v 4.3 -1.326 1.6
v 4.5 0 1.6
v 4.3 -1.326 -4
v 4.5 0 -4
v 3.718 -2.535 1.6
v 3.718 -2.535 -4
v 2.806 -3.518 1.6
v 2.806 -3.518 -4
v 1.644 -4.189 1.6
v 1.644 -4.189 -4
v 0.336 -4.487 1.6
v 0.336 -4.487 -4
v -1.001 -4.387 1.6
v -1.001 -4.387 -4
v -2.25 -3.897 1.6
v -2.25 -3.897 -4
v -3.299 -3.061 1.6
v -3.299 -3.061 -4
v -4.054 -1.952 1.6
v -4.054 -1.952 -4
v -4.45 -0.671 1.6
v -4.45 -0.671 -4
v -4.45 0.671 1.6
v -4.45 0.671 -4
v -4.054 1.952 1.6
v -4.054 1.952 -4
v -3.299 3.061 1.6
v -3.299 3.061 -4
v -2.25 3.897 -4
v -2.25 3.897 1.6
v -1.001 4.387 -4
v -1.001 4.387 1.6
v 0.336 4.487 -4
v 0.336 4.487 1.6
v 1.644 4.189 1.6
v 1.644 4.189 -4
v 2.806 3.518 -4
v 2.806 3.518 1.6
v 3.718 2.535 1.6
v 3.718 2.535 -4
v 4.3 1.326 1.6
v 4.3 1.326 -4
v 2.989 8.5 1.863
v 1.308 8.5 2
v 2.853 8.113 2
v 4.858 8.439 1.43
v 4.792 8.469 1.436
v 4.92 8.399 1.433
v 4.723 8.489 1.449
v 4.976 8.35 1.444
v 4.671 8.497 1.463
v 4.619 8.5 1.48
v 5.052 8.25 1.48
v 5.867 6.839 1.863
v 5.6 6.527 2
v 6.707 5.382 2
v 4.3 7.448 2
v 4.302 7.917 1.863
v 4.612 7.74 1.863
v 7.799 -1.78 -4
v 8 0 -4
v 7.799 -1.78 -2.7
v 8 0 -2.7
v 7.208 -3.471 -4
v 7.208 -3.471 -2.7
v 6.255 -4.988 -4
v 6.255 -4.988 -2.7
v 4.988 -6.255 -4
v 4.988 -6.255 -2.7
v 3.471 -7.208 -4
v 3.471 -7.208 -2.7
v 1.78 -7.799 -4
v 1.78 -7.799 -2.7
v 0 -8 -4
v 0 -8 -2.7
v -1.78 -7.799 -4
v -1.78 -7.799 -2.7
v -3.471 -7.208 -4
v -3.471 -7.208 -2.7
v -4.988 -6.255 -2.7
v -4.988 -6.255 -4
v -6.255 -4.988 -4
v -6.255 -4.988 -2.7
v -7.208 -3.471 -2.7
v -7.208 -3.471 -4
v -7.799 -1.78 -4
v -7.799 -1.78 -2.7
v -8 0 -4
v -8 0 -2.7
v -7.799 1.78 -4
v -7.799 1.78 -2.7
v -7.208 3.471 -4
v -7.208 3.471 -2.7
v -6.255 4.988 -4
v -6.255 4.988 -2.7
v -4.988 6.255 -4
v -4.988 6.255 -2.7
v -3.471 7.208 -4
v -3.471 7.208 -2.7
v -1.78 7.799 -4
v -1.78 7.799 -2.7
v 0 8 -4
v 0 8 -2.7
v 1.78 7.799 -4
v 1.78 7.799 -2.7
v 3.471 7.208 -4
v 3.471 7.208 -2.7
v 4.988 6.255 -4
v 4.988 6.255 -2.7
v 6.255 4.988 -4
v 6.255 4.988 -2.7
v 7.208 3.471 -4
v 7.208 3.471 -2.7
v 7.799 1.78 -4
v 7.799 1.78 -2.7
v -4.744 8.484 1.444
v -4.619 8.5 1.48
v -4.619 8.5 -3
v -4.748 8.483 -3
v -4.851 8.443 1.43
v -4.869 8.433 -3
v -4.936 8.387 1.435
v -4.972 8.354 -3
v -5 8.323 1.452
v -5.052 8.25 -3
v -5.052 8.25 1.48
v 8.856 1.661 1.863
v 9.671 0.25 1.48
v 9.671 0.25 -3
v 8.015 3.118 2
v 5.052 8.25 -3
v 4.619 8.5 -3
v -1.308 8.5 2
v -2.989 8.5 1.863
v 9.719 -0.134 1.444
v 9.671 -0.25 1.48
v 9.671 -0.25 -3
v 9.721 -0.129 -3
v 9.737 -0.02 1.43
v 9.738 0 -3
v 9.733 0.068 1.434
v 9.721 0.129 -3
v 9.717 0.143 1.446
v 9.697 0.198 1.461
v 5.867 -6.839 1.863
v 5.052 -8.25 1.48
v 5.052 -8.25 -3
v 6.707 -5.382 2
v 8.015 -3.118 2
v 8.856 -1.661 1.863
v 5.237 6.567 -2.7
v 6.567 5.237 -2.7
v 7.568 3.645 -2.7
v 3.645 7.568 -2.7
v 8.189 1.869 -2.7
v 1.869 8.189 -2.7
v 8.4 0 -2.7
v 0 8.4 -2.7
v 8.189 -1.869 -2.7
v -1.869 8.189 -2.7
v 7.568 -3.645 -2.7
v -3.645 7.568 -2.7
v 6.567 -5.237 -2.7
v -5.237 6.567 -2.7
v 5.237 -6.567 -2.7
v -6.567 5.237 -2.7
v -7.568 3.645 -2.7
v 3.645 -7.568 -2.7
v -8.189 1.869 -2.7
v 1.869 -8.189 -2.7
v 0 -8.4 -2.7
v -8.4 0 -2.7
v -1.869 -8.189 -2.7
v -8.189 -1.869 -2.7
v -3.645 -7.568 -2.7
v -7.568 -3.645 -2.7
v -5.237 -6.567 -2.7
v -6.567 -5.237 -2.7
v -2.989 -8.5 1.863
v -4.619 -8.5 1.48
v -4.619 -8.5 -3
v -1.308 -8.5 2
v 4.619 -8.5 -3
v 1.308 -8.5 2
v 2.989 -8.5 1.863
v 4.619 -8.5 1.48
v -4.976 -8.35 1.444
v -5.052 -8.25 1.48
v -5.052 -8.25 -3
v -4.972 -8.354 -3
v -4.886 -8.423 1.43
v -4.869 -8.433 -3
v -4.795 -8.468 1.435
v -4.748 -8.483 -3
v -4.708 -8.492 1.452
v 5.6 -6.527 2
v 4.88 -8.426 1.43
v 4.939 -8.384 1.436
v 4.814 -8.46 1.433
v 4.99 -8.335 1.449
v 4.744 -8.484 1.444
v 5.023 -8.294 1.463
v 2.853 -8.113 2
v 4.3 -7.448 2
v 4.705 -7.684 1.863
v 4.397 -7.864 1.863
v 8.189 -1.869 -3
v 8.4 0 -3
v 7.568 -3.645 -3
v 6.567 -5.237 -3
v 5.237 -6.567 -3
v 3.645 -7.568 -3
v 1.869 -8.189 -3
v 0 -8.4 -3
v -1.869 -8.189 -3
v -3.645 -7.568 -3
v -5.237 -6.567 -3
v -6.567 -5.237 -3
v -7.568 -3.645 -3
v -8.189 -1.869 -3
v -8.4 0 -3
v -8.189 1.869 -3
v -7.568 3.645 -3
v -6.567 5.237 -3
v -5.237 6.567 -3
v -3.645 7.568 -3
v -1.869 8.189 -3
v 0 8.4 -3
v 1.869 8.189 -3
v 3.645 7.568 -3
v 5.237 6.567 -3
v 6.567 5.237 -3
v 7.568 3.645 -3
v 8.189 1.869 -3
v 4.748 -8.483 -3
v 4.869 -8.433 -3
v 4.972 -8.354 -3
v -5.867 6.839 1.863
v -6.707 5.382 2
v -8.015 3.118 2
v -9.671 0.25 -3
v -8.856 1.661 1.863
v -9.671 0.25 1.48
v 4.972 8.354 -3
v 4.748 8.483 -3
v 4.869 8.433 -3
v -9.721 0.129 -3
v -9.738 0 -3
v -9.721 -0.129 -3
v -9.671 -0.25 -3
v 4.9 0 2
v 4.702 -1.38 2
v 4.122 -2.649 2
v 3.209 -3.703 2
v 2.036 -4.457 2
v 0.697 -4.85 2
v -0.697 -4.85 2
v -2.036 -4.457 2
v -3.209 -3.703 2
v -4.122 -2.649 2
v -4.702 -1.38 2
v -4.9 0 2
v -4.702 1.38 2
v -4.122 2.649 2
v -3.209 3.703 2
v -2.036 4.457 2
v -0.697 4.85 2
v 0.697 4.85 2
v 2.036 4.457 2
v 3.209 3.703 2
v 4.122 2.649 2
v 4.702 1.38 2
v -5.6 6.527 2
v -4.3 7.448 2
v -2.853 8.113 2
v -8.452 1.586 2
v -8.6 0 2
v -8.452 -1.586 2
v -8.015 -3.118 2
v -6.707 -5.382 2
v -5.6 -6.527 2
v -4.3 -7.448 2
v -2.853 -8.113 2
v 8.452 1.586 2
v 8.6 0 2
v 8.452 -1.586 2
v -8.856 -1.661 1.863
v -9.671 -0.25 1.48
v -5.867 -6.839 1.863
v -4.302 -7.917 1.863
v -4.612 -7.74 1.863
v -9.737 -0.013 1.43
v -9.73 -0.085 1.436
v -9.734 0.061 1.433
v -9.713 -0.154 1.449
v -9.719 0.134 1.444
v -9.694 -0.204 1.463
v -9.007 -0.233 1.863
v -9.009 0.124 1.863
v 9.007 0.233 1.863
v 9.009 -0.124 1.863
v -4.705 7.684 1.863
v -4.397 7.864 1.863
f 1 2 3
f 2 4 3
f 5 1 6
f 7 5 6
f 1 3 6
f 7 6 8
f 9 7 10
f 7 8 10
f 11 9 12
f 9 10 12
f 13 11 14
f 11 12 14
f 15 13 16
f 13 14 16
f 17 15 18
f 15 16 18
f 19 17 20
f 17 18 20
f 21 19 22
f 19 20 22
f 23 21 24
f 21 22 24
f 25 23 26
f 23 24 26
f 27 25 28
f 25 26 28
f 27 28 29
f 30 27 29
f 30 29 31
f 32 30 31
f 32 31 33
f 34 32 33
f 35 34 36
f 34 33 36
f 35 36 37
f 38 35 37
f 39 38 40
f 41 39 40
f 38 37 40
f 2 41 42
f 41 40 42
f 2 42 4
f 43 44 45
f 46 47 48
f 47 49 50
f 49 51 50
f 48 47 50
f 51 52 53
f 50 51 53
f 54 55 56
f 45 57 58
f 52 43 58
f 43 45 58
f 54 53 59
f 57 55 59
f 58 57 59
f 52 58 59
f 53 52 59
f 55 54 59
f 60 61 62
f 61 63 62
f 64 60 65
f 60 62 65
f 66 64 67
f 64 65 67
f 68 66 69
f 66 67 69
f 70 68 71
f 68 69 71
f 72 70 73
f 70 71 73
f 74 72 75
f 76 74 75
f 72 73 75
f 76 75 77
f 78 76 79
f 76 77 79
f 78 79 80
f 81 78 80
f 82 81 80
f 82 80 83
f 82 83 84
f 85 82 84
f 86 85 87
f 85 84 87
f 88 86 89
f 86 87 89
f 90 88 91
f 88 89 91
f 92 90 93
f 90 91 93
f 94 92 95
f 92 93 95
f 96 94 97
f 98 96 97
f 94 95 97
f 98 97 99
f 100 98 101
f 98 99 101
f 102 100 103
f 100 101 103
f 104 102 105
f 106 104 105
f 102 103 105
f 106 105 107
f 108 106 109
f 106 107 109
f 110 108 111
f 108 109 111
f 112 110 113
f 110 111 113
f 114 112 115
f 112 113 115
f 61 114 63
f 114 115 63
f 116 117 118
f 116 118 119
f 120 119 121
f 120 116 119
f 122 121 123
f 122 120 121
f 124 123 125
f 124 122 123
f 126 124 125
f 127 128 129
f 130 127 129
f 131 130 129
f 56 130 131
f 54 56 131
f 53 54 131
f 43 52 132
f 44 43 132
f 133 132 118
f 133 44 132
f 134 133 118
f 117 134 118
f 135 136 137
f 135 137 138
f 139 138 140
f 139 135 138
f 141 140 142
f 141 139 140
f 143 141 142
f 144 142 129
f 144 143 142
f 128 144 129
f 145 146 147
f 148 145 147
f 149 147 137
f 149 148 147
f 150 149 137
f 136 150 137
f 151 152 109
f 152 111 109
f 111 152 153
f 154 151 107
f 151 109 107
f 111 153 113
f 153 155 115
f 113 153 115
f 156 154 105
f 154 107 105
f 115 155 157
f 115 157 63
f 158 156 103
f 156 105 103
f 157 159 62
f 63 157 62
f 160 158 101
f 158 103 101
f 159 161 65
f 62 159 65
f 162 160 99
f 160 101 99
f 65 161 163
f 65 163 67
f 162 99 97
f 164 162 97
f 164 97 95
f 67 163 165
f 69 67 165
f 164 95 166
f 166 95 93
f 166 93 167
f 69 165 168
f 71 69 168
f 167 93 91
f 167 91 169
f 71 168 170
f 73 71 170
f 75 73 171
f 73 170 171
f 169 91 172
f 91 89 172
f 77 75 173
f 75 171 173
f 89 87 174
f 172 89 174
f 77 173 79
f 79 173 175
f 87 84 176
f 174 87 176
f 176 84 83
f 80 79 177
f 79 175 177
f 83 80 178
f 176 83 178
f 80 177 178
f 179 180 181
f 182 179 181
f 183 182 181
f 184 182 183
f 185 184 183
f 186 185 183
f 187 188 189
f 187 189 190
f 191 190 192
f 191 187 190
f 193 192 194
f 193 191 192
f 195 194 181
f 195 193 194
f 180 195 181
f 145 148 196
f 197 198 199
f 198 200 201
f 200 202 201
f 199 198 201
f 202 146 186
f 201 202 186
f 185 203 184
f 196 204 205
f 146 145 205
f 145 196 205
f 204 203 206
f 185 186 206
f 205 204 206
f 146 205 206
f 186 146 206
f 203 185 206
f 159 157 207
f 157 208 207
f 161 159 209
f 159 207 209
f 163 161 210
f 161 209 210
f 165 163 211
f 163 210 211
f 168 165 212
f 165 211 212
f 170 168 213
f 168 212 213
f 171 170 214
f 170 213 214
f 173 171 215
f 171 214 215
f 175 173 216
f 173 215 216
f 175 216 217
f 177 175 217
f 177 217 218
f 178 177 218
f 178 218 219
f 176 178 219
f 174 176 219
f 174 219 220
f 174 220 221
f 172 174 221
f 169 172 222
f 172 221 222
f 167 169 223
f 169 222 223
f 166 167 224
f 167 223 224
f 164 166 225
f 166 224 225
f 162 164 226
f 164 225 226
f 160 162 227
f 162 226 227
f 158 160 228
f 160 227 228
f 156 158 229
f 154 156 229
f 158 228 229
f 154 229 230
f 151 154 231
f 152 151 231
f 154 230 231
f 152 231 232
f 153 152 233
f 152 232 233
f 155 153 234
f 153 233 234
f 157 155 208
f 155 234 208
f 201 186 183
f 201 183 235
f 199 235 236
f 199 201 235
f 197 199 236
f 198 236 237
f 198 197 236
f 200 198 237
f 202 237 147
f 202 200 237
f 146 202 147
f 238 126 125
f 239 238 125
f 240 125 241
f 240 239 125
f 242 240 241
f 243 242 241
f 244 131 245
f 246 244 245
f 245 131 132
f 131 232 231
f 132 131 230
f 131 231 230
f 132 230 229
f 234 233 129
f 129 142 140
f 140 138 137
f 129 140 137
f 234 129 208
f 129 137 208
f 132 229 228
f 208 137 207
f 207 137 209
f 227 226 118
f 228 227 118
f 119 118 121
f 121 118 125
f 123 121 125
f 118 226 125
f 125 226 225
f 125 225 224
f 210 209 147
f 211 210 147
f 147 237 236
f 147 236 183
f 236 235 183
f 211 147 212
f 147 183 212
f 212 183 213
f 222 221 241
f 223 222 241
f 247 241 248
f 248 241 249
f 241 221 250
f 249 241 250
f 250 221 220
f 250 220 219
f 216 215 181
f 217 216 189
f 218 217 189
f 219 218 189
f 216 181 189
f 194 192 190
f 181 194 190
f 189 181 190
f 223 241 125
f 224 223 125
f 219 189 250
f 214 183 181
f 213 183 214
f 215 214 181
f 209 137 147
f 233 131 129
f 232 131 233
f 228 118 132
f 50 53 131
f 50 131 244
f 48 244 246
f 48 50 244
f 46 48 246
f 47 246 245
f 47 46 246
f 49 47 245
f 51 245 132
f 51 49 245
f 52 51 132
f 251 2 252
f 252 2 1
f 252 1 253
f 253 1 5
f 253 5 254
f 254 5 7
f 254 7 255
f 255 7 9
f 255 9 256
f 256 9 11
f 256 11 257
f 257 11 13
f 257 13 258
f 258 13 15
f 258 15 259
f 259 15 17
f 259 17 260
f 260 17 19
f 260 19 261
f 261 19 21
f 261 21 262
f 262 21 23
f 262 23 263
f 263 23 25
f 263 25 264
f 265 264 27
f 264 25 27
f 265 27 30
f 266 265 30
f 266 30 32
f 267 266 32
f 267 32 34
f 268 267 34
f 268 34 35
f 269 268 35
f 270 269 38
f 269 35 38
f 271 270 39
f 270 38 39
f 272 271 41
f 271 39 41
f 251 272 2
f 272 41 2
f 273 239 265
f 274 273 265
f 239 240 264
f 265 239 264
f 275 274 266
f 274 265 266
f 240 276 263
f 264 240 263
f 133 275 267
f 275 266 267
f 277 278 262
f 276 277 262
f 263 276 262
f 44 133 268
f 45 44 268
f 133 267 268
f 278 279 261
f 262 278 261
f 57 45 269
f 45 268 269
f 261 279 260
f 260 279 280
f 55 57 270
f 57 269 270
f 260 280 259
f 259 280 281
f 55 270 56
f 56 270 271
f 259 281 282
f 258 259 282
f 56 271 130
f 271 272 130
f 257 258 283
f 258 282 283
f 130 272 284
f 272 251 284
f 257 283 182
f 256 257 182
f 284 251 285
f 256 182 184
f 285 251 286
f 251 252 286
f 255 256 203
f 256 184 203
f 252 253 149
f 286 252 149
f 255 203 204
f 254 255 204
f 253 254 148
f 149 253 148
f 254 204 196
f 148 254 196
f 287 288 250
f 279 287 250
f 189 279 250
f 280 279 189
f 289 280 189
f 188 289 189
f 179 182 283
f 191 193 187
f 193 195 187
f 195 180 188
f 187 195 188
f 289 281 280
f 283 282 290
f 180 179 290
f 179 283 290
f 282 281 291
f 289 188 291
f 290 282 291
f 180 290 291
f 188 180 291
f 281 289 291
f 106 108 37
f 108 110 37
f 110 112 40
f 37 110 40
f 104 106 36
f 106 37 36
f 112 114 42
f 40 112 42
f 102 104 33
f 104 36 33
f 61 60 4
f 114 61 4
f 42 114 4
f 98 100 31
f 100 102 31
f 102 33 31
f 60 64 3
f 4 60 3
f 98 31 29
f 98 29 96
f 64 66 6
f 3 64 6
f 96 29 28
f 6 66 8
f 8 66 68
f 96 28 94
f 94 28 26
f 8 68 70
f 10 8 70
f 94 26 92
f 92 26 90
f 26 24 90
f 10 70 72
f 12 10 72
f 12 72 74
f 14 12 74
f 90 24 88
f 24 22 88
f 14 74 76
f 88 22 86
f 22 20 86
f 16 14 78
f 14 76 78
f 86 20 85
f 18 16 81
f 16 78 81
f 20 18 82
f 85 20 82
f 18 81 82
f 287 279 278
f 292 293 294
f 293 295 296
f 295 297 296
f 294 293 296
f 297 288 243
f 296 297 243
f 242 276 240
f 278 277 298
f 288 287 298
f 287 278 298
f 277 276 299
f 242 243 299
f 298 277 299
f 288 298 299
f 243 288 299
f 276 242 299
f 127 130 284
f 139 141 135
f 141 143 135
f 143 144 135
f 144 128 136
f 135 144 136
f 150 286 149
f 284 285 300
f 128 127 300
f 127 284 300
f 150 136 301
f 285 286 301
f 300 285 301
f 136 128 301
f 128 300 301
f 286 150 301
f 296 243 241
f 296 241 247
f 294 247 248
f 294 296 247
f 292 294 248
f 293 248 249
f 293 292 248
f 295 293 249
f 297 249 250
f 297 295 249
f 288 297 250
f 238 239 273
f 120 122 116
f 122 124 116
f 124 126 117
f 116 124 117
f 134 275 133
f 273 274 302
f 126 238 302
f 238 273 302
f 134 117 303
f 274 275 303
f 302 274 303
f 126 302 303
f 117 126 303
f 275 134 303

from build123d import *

# Parameters (mm, degrees)
ESQUISSE2_R             = 11.85785331
ENL_V_MAT_EXTRU_1_DEPTH = 10


with BuildPart() as part:
    # Esquisse1 → Révolution1 (revolve)
    with BuildSketch(Plane(origin=(0, 0, 0), x_dir=(0, 0, -1), z_dir=(1, 0, 0))):
        with BuildLine():
            Line((-1.6, 4.5), (4, 4.5))
            Line((4, 4.5), (4, 8))
            Line((4, 8), (3, 8))
            Line((3, 8), (2.7, 8))
            Line((2.7, 8), (2.7, 8.4))
            Line((2.7, 8.4), (3, 8.4))
            Line((3, 8.4), (3, 9.774245233))
            ThreePointArc((3, 9.774245233), (2.898746035, 9.889790175), (2.791709623, 10))
            Line((2.791709623, 10), (-1.191709623, 10))
            ThreePointArc((-1.191709623, 10), (-1.691931822, 9.355470088), (-2, 8.6))
            Line((-2, 8.6), (-2, 4.9))
            Line((-2, 4.9), (-1.6, 4.5))
        make_face()
    revolve(axis=Axis((0, 0, 15.19936), (0, 0, -1)))

    # Esquisse2 → Enlèv. mat.-Extru.1 (cut)
    with BuildSketch(Plane.XY.offset(2)):
        Circle(ESQUISSE2_R)
        with BuildLine():
            Line((-5.051814855, 8.25), (-9.670617009, 0.25))
            ThreePointArc((-9.670617009, 0.25), (-9.737604307, 0), (-9.670617009, -0.25))
            Line((-9.670617009, -0.25), (-5.051814855, -8.25))
            ThreePointArc((-5.051814855, -8.25), (-4.868802154, -8.433012702), (-4.618802154, -8.5))
            Line((-4.618802154, -8.5), (4.618802154, -8.5))
            ThreePointArc((4.618802154, -8.5), (4.868802154, -8.433012702), (5.051814855, -8.25))
            Line((5.051814855, -8.25), (9.670617009, -0.25))
            ThreePointArc((9.670617009, -0.25), (9.737604307, 0), (9.670617009, 0.25))
            Line((9.670617009, 0.25), (5.051814855, 8.25))
            ThreePointArc((5.051814855, 8.25), (4.868802154, 8.433012702), (4.618802154, 8.5))
            Line((4.618802154, 8.5), (-4.618802154, 8.5))
            ThreePointArc((-4.618802154, 8.5), (-4.868802154, 8.433012702), (-5.051814855, 8.25))
        make_face(mode=Mode.SUBTRACT)
    extrude(amount=-ENL_V_MAT_EXTRU_1_DEPTH, mode=Mode.SUBTRACT)


solid = part.part
